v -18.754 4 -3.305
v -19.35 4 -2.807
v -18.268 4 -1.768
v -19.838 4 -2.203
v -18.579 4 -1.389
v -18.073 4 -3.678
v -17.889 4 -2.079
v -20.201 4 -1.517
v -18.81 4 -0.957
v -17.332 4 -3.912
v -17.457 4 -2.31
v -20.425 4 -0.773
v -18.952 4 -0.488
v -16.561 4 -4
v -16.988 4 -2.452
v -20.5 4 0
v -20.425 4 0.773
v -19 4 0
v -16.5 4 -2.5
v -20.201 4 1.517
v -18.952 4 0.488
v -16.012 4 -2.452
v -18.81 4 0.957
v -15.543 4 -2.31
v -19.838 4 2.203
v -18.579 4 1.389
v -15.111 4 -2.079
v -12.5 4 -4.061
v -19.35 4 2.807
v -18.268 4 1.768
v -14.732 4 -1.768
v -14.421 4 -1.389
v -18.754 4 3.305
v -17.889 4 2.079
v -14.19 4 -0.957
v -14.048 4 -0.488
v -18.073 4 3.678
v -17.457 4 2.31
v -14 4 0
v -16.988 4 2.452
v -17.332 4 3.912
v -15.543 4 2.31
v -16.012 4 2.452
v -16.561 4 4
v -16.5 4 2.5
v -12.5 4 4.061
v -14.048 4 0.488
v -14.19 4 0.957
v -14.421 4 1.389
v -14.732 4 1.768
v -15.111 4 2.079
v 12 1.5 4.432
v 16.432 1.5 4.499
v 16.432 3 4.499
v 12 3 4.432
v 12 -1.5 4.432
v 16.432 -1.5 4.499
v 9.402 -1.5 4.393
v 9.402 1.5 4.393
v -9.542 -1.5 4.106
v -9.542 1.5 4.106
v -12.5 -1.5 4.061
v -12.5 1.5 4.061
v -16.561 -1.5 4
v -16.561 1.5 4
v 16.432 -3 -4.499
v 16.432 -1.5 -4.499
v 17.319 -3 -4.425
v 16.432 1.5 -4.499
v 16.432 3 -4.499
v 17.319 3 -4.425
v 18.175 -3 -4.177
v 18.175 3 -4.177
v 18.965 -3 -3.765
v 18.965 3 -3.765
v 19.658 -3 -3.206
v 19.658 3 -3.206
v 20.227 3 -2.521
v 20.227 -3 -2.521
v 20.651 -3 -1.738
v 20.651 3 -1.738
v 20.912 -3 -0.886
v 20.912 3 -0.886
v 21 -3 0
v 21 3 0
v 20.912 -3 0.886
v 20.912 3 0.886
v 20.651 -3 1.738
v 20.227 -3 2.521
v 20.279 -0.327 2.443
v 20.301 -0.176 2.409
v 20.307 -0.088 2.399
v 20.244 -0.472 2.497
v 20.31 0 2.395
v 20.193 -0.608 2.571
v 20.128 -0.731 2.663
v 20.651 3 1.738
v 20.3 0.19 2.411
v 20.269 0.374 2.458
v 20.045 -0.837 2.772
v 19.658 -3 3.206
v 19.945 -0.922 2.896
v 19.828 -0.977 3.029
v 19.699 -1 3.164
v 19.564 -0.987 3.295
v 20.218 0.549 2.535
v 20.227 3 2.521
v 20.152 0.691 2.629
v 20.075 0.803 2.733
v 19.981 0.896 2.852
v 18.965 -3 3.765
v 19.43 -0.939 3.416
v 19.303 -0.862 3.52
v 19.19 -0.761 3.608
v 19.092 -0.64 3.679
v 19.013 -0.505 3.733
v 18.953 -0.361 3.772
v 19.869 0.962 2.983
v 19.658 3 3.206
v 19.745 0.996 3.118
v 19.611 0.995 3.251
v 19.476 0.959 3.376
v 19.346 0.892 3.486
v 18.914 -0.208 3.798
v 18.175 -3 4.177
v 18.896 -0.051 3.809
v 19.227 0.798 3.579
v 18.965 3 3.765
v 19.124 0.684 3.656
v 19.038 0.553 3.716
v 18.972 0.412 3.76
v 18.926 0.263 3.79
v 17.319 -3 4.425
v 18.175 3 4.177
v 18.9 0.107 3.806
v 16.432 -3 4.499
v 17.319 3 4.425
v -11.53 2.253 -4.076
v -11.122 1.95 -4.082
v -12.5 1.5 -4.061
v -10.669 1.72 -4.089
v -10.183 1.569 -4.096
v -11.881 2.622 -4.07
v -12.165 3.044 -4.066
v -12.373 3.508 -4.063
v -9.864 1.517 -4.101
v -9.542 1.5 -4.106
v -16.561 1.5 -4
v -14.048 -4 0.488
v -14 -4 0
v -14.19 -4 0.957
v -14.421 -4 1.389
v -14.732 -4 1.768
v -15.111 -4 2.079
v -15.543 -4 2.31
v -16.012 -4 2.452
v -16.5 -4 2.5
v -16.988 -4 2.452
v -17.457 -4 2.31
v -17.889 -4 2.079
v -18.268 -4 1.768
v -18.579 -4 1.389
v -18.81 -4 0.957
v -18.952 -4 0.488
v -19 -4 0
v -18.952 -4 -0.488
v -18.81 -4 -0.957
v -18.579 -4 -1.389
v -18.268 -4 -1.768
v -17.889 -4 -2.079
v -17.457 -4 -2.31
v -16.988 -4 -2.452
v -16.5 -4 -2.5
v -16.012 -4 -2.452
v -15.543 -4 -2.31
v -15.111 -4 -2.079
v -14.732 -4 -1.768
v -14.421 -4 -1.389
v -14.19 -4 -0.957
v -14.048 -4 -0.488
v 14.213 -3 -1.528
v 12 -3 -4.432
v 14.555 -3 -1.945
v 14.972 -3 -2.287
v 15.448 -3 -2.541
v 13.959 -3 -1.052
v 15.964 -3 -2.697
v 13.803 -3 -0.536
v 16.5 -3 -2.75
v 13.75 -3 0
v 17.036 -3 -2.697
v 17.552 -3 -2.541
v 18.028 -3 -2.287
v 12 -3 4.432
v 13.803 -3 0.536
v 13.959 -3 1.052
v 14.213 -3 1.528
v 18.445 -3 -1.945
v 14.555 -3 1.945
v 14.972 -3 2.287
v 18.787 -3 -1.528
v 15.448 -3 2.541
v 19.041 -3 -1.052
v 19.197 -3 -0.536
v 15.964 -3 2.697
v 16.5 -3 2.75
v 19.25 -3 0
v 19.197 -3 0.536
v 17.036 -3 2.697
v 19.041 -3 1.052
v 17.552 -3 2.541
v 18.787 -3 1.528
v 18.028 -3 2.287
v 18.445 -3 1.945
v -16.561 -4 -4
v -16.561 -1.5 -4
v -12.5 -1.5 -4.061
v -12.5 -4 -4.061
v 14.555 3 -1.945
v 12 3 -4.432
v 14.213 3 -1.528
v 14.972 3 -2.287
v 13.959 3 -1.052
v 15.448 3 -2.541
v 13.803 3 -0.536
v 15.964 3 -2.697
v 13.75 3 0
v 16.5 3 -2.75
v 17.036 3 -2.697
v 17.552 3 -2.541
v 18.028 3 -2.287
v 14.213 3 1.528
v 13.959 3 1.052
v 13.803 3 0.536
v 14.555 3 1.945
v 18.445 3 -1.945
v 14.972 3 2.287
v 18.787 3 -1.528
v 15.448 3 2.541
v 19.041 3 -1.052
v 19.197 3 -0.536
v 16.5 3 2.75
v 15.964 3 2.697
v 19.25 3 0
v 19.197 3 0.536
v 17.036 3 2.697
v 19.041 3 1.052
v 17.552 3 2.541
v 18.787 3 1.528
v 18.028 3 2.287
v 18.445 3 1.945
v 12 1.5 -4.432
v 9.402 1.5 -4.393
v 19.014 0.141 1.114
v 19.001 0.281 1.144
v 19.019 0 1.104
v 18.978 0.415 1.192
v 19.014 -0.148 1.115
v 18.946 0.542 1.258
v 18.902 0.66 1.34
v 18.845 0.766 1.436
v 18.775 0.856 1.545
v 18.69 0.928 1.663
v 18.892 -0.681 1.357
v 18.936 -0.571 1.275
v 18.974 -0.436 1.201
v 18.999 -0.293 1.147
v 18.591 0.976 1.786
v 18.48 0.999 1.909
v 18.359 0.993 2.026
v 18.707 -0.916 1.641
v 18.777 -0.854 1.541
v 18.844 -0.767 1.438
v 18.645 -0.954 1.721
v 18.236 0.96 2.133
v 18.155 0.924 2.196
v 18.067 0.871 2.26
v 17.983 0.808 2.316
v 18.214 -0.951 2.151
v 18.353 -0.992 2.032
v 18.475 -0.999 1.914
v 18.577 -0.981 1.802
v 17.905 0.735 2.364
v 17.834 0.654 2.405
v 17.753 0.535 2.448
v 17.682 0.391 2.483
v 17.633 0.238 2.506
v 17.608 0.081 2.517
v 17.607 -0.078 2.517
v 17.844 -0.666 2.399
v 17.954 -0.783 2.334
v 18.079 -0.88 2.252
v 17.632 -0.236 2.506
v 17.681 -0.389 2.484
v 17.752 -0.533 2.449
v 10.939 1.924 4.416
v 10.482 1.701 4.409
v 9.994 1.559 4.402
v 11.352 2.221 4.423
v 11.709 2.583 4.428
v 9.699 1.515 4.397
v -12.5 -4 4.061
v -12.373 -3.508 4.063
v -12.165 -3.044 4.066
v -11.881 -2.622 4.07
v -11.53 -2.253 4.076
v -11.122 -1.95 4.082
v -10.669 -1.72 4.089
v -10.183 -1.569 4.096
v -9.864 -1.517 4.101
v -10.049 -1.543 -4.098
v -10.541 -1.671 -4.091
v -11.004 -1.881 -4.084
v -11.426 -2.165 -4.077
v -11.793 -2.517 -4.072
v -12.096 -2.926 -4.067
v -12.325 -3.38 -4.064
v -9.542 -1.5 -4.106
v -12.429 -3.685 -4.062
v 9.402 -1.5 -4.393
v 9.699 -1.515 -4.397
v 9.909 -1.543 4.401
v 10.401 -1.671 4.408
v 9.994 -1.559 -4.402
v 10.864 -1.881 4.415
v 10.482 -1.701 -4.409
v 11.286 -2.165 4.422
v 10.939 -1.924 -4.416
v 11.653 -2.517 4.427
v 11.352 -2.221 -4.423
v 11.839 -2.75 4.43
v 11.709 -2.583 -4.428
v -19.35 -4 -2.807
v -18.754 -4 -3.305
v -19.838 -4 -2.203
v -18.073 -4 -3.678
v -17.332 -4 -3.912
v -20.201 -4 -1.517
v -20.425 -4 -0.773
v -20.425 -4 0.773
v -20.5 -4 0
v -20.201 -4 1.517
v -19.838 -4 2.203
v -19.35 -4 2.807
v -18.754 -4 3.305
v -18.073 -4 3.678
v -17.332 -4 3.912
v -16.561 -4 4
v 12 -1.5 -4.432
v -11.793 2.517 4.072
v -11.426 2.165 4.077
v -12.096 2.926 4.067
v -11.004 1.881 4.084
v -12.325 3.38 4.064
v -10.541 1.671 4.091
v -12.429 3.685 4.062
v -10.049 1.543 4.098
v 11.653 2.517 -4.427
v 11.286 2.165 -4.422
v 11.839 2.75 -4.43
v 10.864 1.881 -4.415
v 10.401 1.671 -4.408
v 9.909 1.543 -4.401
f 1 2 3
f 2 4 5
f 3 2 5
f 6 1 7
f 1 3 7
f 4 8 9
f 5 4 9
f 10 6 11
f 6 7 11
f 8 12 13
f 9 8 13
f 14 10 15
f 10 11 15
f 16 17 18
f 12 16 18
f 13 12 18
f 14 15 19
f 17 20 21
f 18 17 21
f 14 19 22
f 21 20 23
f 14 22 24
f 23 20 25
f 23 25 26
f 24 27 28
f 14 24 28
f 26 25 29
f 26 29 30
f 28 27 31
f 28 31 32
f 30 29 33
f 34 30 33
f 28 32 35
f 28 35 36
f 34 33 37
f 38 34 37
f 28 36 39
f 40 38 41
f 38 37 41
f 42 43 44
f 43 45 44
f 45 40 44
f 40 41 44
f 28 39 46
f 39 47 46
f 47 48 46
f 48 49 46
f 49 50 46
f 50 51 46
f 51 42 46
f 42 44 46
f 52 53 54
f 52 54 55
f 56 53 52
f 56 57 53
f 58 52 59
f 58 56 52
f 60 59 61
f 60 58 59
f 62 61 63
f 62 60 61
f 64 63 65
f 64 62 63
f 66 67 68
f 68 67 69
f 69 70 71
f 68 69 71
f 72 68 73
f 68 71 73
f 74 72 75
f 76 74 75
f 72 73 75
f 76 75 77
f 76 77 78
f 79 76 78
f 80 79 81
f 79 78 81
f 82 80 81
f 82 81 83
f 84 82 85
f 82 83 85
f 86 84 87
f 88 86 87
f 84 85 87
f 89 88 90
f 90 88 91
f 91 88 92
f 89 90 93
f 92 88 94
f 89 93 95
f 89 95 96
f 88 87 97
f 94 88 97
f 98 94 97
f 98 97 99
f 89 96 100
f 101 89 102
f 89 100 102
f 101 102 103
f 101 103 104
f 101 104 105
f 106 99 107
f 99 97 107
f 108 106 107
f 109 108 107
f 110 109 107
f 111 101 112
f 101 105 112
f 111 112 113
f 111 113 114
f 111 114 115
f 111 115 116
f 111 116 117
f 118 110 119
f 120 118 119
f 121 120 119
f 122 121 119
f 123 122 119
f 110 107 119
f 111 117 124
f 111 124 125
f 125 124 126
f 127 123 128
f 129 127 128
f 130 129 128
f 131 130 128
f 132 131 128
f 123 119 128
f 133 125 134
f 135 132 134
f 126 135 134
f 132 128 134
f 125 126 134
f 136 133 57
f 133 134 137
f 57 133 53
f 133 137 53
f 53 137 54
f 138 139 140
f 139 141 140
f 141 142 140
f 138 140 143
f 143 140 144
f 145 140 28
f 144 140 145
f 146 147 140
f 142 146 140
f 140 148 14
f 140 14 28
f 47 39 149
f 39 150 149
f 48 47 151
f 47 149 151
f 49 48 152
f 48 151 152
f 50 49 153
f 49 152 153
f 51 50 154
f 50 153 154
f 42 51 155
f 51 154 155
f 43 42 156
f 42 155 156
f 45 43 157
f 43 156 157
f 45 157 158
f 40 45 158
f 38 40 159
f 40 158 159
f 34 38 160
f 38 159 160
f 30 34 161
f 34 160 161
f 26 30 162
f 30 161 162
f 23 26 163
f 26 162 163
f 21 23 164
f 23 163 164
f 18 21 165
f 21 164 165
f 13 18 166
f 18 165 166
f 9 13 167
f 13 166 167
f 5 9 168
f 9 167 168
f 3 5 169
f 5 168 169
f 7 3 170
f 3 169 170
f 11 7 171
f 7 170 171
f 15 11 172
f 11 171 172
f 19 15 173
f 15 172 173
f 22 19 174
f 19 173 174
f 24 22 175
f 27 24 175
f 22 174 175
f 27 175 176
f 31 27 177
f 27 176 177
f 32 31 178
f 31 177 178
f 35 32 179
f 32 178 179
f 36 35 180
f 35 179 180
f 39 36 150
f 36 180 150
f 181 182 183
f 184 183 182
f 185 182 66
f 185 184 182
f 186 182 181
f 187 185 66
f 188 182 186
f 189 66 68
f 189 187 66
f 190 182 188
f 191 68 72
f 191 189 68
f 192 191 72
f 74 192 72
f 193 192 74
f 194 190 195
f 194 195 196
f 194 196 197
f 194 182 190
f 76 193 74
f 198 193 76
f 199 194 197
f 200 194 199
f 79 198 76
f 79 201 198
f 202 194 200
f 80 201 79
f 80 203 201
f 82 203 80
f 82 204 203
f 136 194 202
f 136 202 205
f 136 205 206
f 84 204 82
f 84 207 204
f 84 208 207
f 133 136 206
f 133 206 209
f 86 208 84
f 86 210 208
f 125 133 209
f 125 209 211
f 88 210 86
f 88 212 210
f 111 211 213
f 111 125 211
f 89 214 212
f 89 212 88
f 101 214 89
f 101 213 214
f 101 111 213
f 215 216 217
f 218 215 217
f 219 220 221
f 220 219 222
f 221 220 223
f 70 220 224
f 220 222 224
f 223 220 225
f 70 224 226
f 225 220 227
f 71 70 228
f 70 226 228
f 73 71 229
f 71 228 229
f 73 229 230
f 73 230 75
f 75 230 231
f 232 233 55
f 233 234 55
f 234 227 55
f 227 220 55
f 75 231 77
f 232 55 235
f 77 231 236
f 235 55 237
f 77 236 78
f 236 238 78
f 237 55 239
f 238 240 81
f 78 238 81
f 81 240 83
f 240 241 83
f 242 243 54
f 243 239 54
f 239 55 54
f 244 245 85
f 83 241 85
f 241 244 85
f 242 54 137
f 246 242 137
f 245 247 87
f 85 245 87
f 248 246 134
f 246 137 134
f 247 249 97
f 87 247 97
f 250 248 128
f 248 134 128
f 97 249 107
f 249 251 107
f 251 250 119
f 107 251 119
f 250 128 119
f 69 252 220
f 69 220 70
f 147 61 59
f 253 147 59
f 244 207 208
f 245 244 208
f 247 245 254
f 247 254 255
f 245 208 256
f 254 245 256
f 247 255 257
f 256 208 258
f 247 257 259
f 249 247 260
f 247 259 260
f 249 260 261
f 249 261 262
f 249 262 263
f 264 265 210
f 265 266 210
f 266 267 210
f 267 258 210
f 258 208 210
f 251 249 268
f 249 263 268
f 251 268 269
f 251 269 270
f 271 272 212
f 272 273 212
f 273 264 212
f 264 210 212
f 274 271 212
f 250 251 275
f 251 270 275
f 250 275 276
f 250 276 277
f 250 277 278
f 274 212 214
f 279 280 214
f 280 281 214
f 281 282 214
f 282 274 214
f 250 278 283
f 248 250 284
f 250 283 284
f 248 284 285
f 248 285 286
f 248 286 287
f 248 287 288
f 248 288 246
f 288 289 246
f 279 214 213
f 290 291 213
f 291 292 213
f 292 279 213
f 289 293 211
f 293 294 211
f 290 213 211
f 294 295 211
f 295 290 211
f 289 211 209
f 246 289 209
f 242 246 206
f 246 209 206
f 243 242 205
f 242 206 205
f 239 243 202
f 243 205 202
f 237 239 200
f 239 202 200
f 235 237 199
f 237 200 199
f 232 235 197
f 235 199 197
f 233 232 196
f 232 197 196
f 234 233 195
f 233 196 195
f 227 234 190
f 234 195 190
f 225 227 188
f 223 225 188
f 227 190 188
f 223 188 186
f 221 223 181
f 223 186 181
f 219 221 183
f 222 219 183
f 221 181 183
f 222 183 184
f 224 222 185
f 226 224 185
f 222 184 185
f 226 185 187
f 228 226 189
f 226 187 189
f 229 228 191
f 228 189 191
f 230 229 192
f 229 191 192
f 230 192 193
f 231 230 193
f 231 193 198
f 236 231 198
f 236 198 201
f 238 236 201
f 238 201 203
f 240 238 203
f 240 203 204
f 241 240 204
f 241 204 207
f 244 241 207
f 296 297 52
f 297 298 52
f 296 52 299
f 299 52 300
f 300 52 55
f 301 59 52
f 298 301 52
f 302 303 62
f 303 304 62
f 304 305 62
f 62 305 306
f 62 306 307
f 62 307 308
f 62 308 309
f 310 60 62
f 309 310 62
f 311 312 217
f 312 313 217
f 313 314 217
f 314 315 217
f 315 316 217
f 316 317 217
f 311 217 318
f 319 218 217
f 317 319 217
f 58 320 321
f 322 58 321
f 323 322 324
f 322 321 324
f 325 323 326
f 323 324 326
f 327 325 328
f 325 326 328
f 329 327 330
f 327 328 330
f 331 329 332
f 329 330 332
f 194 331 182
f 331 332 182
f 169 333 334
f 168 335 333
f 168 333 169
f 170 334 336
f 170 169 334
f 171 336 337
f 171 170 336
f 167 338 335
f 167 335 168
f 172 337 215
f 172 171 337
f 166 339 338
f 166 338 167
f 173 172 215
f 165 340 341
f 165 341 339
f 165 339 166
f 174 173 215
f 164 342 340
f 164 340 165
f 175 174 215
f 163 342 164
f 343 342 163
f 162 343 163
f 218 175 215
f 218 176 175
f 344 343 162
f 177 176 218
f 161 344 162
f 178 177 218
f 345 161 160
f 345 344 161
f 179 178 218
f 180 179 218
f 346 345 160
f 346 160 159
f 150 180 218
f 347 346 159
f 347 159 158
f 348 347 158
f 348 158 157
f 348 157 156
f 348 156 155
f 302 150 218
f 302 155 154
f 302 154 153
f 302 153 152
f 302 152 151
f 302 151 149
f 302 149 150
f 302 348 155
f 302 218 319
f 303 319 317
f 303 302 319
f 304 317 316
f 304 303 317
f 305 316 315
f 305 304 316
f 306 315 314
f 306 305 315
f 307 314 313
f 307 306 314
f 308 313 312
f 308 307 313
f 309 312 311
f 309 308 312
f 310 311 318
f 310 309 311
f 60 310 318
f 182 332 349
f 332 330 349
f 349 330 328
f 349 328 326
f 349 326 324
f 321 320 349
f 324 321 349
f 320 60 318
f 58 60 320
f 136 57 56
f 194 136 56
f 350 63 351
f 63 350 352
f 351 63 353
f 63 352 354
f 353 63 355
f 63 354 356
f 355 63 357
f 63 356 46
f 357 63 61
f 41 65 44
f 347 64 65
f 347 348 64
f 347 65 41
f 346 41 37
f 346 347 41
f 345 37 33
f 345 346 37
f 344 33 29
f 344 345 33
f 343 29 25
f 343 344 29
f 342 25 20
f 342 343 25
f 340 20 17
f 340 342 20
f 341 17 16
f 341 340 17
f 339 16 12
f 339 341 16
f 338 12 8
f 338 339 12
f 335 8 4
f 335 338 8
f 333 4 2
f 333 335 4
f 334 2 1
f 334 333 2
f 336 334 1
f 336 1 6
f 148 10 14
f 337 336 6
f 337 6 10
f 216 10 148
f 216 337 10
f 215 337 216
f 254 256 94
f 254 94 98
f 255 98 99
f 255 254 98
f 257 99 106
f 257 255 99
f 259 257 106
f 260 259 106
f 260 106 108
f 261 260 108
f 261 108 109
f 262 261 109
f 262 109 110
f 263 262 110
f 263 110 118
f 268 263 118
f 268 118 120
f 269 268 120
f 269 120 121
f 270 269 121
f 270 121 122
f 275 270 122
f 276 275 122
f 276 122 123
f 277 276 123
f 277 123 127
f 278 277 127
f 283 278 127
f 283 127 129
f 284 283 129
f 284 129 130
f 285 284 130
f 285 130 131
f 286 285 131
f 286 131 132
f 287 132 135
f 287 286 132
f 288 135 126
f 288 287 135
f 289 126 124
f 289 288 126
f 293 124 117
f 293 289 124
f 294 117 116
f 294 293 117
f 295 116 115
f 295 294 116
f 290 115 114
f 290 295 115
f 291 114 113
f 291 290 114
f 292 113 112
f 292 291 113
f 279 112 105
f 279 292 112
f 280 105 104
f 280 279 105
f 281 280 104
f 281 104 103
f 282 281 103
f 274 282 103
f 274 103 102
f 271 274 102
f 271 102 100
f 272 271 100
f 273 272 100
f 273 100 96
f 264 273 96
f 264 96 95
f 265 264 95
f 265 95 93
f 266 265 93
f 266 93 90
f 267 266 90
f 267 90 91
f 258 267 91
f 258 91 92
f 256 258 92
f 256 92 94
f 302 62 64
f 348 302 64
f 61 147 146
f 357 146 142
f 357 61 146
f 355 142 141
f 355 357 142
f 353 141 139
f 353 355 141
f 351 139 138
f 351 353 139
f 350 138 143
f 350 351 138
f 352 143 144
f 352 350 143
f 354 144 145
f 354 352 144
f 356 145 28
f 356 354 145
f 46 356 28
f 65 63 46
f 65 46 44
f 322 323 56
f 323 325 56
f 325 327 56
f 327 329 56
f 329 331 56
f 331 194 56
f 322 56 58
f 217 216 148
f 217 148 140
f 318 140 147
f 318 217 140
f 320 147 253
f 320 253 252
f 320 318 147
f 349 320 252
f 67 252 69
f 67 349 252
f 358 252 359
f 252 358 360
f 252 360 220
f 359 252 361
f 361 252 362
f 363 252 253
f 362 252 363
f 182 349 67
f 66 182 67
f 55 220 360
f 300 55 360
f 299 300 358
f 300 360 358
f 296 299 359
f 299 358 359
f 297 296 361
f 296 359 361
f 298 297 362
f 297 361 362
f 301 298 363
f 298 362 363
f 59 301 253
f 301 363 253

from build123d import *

# Parameters (mm, degrees)
F1_DEPTH      = 1.5
F1_DEPTH_BACK = 1.5
F3_DEPTH      = 4
F3_DEPTH_BACK = 4
F5_DEPTH      = 3
F5_DEPTH_BACK = 3
F6_R          = 2.5
F6_R_2        = 2.75
F7_DEPTH      = 4.001
F7_DEPTH_BACK = 4.001
F8_T4_DEPTH   = 22.9123439264
F8_T10_DEPTH  = 21.8550350011
F8_T16_DEPTH  = 21.8550350011
F8_T22_DEPTH  = 22.9123439264
F10_R         = 1
F11_DEPTH     = 6.3649610307


# Not quite as in the source:
# - a fillet or chamfer that OpenCascade refuses, or shapes differently, is made with other operations: its cross-section is extruded or revolved along the edge and cut away or added


with BuildPart() as f1:
    # F0 (on Front) → F1 (new body, two sides)
    with BuildSketch(Plane.XZ) as f1_sk:
        with BuildLine():
            Line((16.4318181818, 4.4994834414), (-16.5606060606, 3.9995408368))
            ThreePointArc((-16.5606060606, 3.9995408368), (-20.5, 0), (-16.5606060606, -3.9995408368))
            Line((-16.5606060606, -3.9995408368), (16.4318181818, -4.4994834414))
            ThreePointArc((16.4318181818, -4.4994834414), (21, 0), (16.4318181818, 4.4994834414))
        make_face()
    extrude(amount=F1_DEPTH)
    extrude(f1_sk.sketch, amount=-F1_DEPTH_BACK)

    # F2 (on Front) → F3 (join, two sides)
    with BuildSketch(Plane.XZ) as f3_sk:
        with BuildLine():
            Line((-12.5, 4.0610722343), (-16.5606060606, 3.9995408368))
            ThreePointArc((-16.5606060606, 3.9995408368), (-20.5, 0), (-16.5606060606, -3.9995408368))
            Line((-16.5606060606, -3.9995408368), (-12.5, -4.0610722343))
            Line((-12.5, -4.0610722343), (-12.5, 4.0610722343))
        make_face()
    extrude(amount=F3_DEPTH)
    extrude(f3_sk.sketch, amount=-F3_DEPTH_BACK)

    # F4 (on Front) → F5 (join, two sides)
    with BuildSketch(Plane.XZ) as f5_sk:
        with BuildLine():
            Line((16.4318181818, 4.4994834414), (12, 4.4323269722))
            Line((12, 4.4323269722), (12, -4.4323269722))
            Line((12, -4.4323269722), (16.4318181818, -4.4994834414))
            ThreePointArc((16.4318181818, -4.4994834414), (21, 0), (16.4318181818, 4.4994834414))
        make_face()
    extrude(amount=F5_DEPTH)
    extrude(f5_sk.sketch, amount=-F5_DEPTH_BACK)

    # F6 (on Front) → F7 (cut, two sides)
    with BuildSketch(Plane.XZ) as f7_sk:
        with Locations((-16.5, 0)):
            Circle(F6_R)
        with Locations((16.5, 0)):
            Circle(F6_R_2)
    extrude(amount=-F7_DEPTH, mode=Mode.SUBTRACT)
    extrude(f7_sk.sketch, amount=F7_DEPTH_BACK, mode=Mode.SUBTRACT)

    # F8: fillet of radius 3 on 4 edges, made by hand


with BuildPart() as f8_tool2:
    # F8_s3 → F8_t4 (new body)
    with BuildSketch(Plane.XY.offset(11.4561719632)):
        with BuildLine():
            ThreePointArc((-12.5, -4), (-11.4784517816, -2.2087121525), (-9.5419601084, -1.5))
            Line((-9.5419601084, -1.5), (-12.5, -1.5))
            Line((-12.5, -1.5), (-12.5, -4))
        make_face()
    extrude(amount=-F8_T4_DEPTH)

    split(bisect_by=Plane(origin=(-0.0643939394, 0, -4.2495121391), x_dir=(0, 1, 0), z_dir=(0.0151515152, 0, 0.9998852092)), keep=Keep.TOP)

    split(bisect_by=Plane(origin=(-0.0643939394, 0, 4.2495121391), x_dir=(0, 1, 0), z_dir=(0.0151515152, 0, -0.9998852092)), keep=Keep.TOP)


with BuildPart() as f1_1:
    add(f1.part)

    # F8_t1: union F8_tool2
    add(f8_tool2.part)


with BuildPart() as f8_tool8:
    # F8_s9 → F8_t10 (new body)
    with BuildSketch(Plane.XY.offset(-10.9275175005)):
        with BuildLine():
            ThreePointArc((9.4019237886, -1.5), (10.9019237886, -1.9019237886), (12, -3))
            Line((12, -3), (12, -1.5))
            Line((12, -1.5), (9.4019237886, -1.5))
        make_face()
    extrude(amount=F8_T10_DEPTH)

    split(bisect_by=Plane(origin=(-0.0643939394, 0, -4.2495121391), x_dir=(0, 1, 0), z_dir=(0.0151515152, 0, 0.9998852092)), keep=Keep.TOP)

    split(bisect_by=Plane(origin=(-0.0643939394, 0, 4.2495121391), x_dir=(0, 1, 0), z_dir=(0.0151515152, 0, -0.9998852092)), keep=Keep.TOP)


with BuildPart() as f1_2:
    add(f1_1.part)

    # F8_t7: union F8_tool8
    add(f8_tool8.part)


with BuildPart() as f8_tool14:
    # F8_s15 → F8_t16 (new body)
    with BuildSketch(Plane.XY.offset(-10.9275175005)):
        with BuildLine():
            ThreePointArc((12, 3), (10.9019237886, 1.9019237886), (9.4019237886, 1.5))
            Line((9.4019237886, 1.5), (12, 1.5))
            Line((12, 1.5), (12, 3))
        make_face()
    extrude(amount=F8_T16_DEPTH)

    split(bisect_by=Plane(origin=(-0.0643939394, 0, -4.2495121391), x_dir=(0, 1, 0), z_dir=(0.0151515152, 0, 0.9998852092)), keep=Keep.TOP)

    split(bisect_by=Plane(origin=(-0.0643939394, 0, 4.2495121391), x_dir=(0, 1, 0), z_dir=(0.0151515152, 0, -0.9998852092)), keep=Keep.TOP)


with BuildPart() as f1_3:
    add(f1_2.part)

    # F8_t13: union F8_tool14
    add(f8_tool14.part)


with BuildPart() as f8_tool20:
    # F8_s21 → F8_t22 (new body)
    with BuildSketch(Plane.XY.offset(11.4561719632)):
        with BuildLine():
            ThreePointArc((-9.5419601084, 1.5), (-11.4784517816, 2.2087121525), (-12.5, 4))
            Line((-12.5, 4), (-12.5, 1.5))
            Line((-12.5, 1.5), (-9.5419601084, 1.5))
        make_face()
    extrude(amount=-F8_T22_DEPTH)

    split(bisect_by=Plane(origin=(-0.0643939394, 0, -4.2495121391), x_dir=(0, 1, 0), z_dir=(0.0151515152, 0, 0.9998852092)), keep=Keep.TOP)

    split(bisect_by=Plane(origin=(-0.0643939394, 0, 4.2495121391), x_dir=(0, 1, 0), z_dir=(0.0151515152, 0, -0.9998852092)), keep=Keep.TOP)


with BuildPart() as f1_4:
    add(f1_3.part)

    # F8_t19: union F8_tool20
    add(f8_tool20.part)

    # F10 (on face) → F11 (cut, through all)
    with BuildSketch(Plane(origin=(8.25, 0, 8.25), x_dir=(0.7071067812, 0, -0.7071067812), z_dir=(0.7071067812, 0, 0.7071067812))):
        with Locations((11.6672618896, 0)):
            Circle(F10_R)
    extrude(amount=F11_DEPTH, mode=Mode.SUBTRACT)


solid = f1_4.part
